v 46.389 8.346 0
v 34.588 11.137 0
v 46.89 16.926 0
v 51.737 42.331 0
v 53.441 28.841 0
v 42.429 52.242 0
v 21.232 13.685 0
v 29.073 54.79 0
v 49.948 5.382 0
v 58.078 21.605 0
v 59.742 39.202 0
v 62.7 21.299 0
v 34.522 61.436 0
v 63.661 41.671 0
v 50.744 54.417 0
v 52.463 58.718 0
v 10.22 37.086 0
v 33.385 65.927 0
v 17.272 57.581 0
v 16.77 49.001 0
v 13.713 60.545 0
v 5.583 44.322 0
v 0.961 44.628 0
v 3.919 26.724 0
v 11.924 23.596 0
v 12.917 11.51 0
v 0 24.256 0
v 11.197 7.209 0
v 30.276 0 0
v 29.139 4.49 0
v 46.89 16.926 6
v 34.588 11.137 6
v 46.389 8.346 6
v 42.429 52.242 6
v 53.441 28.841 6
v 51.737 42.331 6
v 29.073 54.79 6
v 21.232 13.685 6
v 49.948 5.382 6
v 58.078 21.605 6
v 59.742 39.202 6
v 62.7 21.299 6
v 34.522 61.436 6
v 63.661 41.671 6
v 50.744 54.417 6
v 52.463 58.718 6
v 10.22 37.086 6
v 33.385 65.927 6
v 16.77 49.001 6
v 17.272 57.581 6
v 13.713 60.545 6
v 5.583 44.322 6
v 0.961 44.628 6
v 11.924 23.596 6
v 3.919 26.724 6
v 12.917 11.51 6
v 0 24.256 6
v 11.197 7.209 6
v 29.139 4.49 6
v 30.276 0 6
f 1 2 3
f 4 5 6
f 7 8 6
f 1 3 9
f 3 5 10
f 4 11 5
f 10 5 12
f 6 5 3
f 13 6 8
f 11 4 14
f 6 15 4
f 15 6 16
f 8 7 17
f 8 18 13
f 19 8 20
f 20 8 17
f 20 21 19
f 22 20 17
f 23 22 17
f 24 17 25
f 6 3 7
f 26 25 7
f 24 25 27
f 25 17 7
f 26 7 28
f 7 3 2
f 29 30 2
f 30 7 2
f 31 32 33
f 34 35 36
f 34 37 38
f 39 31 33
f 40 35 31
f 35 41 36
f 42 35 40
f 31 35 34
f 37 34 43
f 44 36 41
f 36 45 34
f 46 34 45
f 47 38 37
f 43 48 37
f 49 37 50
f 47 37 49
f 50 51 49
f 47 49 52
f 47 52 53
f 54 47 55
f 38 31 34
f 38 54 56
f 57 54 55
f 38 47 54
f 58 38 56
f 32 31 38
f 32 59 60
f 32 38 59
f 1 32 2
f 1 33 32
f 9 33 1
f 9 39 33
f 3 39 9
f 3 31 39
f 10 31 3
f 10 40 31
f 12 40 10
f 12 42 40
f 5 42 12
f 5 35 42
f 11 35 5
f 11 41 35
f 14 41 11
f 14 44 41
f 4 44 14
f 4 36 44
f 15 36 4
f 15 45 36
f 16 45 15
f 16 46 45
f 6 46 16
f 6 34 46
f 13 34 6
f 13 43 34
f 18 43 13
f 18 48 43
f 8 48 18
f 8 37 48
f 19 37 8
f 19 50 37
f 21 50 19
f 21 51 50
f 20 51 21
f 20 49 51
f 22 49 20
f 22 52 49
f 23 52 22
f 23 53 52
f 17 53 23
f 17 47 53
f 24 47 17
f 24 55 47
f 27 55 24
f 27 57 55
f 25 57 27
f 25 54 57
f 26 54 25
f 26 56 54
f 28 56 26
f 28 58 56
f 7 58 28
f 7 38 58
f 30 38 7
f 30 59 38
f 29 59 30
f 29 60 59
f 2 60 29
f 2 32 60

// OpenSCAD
$fn = 32;

// ----------------------------------------------------------------------
// Fan rotor section: 10 blades, 22 mm hub radius, 11 mm blades
// ----------------------------------------------------------------------

// --- parameters (mm) ---
profile_height = 6;       // extrusion height
profile_points = 30;      // points of the closed outline

profile = [[53.441, 28.841], [59.742, 39.202], [63.661, 41.671], [51.737, 42.331], [50.744, 54.417], [52.463, 58.718], [42.429, 52.242], [34.522, 61.436], [33.385, 65.927], [29.073, 54.79], [17.272, 57.581], [13.713, 60.545], [16.77, 49.001], [5.583, 44.322], [0.961, 44.628], [10.22, 37.086], [3.919, 26.724], [0, 24.256], [11.924, 23.596], [12.917, 11.51], [11.197, 7.209], [21.232, 13.685], [29.139, 4.49], [30.276, 0], [34.588, 11.137], [46.389, 8.346], [49.948, 5.382], [46.89, 16.926], [58.078, 21.605], [62.7, 21.299]];  // single closed polygon, 30 points, counter clockwise

// --- the one profile operation ---
linear_extrude(height = profile_height) polygon(points = profile);
